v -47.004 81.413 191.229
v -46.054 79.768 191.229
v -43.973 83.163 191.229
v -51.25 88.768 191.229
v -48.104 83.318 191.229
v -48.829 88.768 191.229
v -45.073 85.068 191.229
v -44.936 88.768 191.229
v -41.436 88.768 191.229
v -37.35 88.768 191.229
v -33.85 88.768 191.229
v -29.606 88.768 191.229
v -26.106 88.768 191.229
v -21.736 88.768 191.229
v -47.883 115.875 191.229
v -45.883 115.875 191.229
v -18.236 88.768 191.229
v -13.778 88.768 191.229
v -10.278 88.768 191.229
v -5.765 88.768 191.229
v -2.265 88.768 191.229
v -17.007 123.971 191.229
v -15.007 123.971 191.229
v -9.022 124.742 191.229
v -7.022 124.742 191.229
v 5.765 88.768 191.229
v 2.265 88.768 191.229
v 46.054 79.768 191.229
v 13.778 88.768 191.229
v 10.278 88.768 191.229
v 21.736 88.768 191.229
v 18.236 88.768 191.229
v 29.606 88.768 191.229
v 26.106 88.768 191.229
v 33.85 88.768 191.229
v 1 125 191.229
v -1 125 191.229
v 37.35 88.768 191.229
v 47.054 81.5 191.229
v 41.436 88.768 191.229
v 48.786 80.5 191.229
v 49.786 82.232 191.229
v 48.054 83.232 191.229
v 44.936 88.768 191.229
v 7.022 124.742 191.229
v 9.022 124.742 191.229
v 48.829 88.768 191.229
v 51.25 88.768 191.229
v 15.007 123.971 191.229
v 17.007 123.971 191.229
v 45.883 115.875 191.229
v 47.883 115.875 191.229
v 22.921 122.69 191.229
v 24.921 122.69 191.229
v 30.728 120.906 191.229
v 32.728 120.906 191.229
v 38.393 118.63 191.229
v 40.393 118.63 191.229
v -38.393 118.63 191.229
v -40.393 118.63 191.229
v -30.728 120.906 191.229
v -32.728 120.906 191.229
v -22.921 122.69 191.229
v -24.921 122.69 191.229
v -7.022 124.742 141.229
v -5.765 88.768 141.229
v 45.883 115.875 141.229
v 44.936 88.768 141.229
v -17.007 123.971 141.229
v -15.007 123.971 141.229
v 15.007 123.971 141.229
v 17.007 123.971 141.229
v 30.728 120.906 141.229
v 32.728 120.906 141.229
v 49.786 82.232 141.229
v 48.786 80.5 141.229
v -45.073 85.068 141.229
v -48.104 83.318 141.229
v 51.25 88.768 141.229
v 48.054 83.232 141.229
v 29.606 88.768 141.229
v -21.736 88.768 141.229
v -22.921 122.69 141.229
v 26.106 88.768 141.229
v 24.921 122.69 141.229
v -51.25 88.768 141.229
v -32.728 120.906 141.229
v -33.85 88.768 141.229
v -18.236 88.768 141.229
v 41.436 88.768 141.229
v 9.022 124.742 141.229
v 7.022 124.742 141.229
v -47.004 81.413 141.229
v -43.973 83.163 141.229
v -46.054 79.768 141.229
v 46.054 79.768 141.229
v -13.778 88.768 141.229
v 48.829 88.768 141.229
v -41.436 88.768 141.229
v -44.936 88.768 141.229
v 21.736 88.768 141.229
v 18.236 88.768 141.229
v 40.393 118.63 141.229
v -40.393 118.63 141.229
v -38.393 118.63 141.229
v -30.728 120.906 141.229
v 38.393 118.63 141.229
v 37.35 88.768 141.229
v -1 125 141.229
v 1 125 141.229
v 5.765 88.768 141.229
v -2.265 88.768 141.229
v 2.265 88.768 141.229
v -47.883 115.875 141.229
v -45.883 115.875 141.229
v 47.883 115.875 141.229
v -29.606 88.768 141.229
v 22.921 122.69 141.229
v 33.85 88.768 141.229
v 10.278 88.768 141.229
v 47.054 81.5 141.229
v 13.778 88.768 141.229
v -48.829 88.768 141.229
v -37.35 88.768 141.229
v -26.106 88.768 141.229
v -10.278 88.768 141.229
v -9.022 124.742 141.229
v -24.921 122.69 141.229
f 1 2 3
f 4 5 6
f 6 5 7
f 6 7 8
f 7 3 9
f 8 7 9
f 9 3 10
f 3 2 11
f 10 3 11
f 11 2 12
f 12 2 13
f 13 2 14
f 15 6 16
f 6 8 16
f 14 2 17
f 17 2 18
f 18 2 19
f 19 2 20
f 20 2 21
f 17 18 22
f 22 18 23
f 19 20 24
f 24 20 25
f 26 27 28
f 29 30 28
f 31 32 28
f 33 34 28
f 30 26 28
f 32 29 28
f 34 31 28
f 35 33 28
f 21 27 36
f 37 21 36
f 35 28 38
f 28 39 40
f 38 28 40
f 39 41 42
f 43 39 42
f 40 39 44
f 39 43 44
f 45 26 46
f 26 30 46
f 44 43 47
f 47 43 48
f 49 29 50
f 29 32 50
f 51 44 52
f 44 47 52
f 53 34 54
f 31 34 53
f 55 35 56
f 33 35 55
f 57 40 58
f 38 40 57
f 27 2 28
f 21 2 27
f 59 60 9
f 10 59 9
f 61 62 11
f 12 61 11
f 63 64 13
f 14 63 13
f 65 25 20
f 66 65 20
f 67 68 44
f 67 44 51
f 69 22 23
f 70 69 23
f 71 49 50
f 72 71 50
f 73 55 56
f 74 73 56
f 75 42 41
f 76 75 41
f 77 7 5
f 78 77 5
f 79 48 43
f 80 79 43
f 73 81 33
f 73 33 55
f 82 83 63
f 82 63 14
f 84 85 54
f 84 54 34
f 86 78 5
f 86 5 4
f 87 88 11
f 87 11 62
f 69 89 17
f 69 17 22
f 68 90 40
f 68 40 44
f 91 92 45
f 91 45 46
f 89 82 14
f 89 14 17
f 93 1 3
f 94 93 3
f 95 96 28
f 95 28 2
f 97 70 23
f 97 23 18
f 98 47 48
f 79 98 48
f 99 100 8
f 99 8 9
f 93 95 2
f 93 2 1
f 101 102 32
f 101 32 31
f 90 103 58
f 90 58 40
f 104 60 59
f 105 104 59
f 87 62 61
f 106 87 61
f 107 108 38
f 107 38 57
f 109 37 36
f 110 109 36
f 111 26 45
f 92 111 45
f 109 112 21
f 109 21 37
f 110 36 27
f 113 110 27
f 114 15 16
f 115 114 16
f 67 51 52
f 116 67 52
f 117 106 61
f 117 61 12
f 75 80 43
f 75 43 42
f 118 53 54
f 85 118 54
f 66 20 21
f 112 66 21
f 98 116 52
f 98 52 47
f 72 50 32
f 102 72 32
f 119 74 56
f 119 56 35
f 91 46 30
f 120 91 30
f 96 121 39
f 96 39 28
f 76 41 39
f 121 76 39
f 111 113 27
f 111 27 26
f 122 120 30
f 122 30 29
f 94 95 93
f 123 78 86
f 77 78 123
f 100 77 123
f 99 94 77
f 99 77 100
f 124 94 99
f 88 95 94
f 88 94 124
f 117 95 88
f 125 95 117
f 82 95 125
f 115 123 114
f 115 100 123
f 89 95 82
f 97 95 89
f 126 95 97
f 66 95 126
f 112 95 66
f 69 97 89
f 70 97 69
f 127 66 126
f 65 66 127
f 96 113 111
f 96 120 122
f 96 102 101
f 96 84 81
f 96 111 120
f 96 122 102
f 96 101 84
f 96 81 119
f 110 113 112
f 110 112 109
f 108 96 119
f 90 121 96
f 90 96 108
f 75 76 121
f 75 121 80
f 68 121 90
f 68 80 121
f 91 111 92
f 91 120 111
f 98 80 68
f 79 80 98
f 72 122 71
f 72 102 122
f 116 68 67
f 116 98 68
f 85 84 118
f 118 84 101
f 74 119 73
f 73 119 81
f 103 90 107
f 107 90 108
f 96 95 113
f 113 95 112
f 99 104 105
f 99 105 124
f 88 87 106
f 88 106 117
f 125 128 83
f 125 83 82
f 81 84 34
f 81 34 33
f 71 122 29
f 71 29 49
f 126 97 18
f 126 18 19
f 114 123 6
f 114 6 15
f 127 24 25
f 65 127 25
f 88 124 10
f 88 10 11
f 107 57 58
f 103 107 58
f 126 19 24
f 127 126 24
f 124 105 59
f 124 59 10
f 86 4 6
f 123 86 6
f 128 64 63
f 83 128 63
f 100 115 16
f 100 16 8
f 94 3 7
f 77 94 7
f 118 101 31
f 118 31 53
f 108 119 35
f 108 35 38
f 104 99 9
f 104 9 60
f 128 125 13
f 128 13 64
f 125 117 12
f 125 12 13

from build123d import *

# Parameters (mm, degrees)
RESSALTO_EXTRUS_O1_DEPTH    = 285
CORTE_EXTRUS_O1_DEPTH       = 286
RESSALTO_EXTRUS_O3_DEPTH    = 285
ESBO_O13_W                  = 1.5
ESBO_O13_H                  = 2
CORTE_EXTRUS_O7_DEPTH       = 52.25
CORTE_EXTRUS_O7_DEPTH_BACK  = 52.25
RESSALTO_EXTRUS_O5_DEPTH    = 10
ESBO_O5_R                   = 1.25
CORTE_EXTRUS_O3_DEPTH       = 10
ESBO_O6_W                   = 10
ESBO_O6_H                   = 6.190700041
RESSALTO_EXTRUS_O4_DEPTH    = 11
ESBO_O7_R                   = 2.25
CORTE_EXTRUS_O4_DEPTH       = 12
ESBO_O9_R                   = 1.65
CORTE_EXTRUS_O5_DEPTH       = 10
RESSALTO_EXTRUS_O6_DEPTH    = 15
ESBO_O12_R                  = 2.5
CORTE_EXTRUS_O8_DEPTH       = 20
CORTE_EXTRUS_O9_START       = -11
ESBO_O14_R                  = 6
CORTE_EXTRUS_O9_DEPTH       = 100
PADR_O_LINEAR1_COUNT        = 2
PADR_O_LINEAR1_PITCH        = 230
ESBO_O16_W                  = 118.931950447
ESBO_O16_H                  = 98.407051197
ESBO_O16_W_2                = 168.047643727
ESBO_O16_H_2                = 92.783791129
CORTE_EXTRUS_O11_DEPTH      = 55.553847577
CORTE_EXTRUS_O11_DEPTH_BACK = 55.603847577


with BuildPart() as part:
    # Esboço1 → Ressalto-extrusão1 (new body)
    with BuildSketch(Plane.XY):
        Polygon((-46.053847577, 79.767603888), (-51.25, 88.767603888), (-48.82913331, 88.767603888), (-47.882520117, 115.87505904), (-45.882520117, 115.87505904), (-44.935906924, 88.767603888), (-41.435906924, 88.767603888), (-40.393073045, 118.630458973), (-38.393073045, 118.630458973), (-37.350239166, 88.767603888), (-33.850239166, 88.767603888), (-32.727930438, 120.906320886), (-30.727930438, 120.906320886), (-29.60562171, 88.767603888), (-26.10562171, 88.767603888), (-24.921032923, 122.689788425), (-22.921032923, 122.689788425), (-21.736444137, 88.767603888), (-18.236444137, 88.767603888), (-17.007119627, 123.970851902), (-15.007119627, 123.970851902), (-13.777795118, 88.767603888), (-10.277795118, 88.767603888), (-9.021529135, 124.742354757), (-7.021529135, 124.742354757), (-5.765263153, 88.767603888), (-2.265263153, 88.767603888), (-1, 125), (1, 125), (2.265263153, 88.767603888), (5.765263153, 88.767603888), (7.021529135, 124.742354757), (9.021529135, 124.742354757), (10.277795118, 88.767603888), (13.777795118, 88.767603888), (15.007119627, 123.970851902), (17.007119627, 123.970851902), (18.236444137, 88.767603888), (21.736444137, 88.767603888), (22.921032923, 122.689788425), (24.921032923, 122.689788425), (26.10562171, 88.767603888), (29.60562171, 88.767603888), (30.727930438, 120.906320886), (32.727930438, 120.906320886), (33.850239166, 88.767603888), (37.350239166, 88.767603888), (38.393073045, 118.630458973), (40.393073045, 118.630458973), (41.435906924, 88.767603888), (44.935906924, 88.767603888), (45.882520117, 115.87505904), (47.882520117, 115.87505904), (48.82913331, 88.767603888), (51.25, 88.767603888), (46.053847577, 79.767603888), align=None)
    extrude(amount=RESSALTO_EXTRUS_O1_DEPTH)

    # Esboço2 → Corte-extrusão1 (cut, through all)
    with BuildSketch(Plane.XY.offset(285)):
        Polygon((-47.003847577, 81.413052155), (-43.972758664, 83.163052155), (-45.072758664, 85.068308043), (-48.103847577, 83.318308043), align=None)
    extrude(amount=-CORTE_EXTRUS_O1_DEPTH, mode=Mode.SUBTRACT)


with BuildPart() as body_2:
    # Esboço3 → Ressalto-extrusão3 (new body)
    with BuildSketch(Plane.XY.offset(285)):
        Polygon((47.053847577, 81.499654695), (48.053847577, 83.231705503), (49.785898385, 82.231705503), (48.785898385, 80.499654695), align=None)
    extrude(amount=-RESSALTO_EXTRUS_O3_DEPTH)


with BuildPart() as corte_extrus_o7_tool:
    # Esboço13 → Corte-extrusão7 (new body, two sides)
    with BuildSketch(Plane(origin=(0, 0, 0), x_dir=(0, 0, -1), z_dir=(1, 0, 0))) as corte_extrus_o7_sk:
        with Locations((-284.25, 82.767603888)):
            Rectangle(ESBO_O13_W, ESBO_O13_H)
    extrude(amount=CORTE_EXTRUS_O7_DEPTH)
    extrude(corte_extrus_o7_sk.sketch, amount=-CORTE_EXTRUS_O7_DEPTH_BACK)


with BuildPart() as part_1:
    add(part.part)

    # Corte-extrusão7: cut by corte_extrus_o7_tool
    add(corte_extrus_o7_tool.part, mode=Mode.SUBTRACT)



with BuildPart() as body_2_1:
    add(body_2.part)

    # Corte-extrusão7: cut by corte_extrus_o7_tool
    add(corte_extrus_o7_tool.part, mode=Mode.SUBTRACT)


with BuildPart() as part_2:
    add(part_1.part)

    add(body_2_1.part)  # Ressalto-extrusão5 merges body 2
    # Esboço8 → Ressalto-extrusão5 (add)
    with BuildSketch(Plane(origin=(0, 0, 0), x_dir=(0, 0, -1), z_dir=(0.866025404, -0.5, 0))):
        with BuildLine():
            Line((-280, 104.107695155), (-280, 96.107695155))
            Line((-280, 96.107695155), (-270, 96.107695155))
            Line((-270, 96.107695155), (-270, 104.107695155))
            ThreePointArc((-270, 104.107695155), (-275, 109.107695155), (-280, 104.107695155))
        make_face()
    ressalto_extrus_o5 = extrude(amount=-RESSALTO_EXTRUS_O5_DEPTH)

    # Esboço5 → Corte-extrusão3 (cut)
    with BuildSketch(Plane.XY.offset(285)):
        with Locations((-30, 85.267603888)):
            Circle(ESBO_O5_R)
        with Locations((30, 85.267603888)):
            Circle(ESBO_O5_R)
    extrude(amount=-CORTE_EXTRUS_O3_DEPTH, mode=Mode.SUBTRACT)

    # Esboço6 → Ressalto-extrusão4 (add)
    with BuildSketch(Plane(origin=(0, 0, 0), x_dir=(0, 0, 1), z_dir=(-0.866025404, -0.5, 0))):
        with BuildLine():
            Line((280, 102.5), (280, 104.207693629))
            ThreePointArc((280, 104.207693629), (275, 109.207695155), (270, 104.207693629))
            Line((270, 104.207693629), (270, 102.5))
            Line((270, 102.5), (280, 102.5))
        make_face()
        with Locations((275, 99.404649979)):
            Rectangle(ESBO_O6_W, ESBO_O6_H)
    ressalto_extrus_o4 = extrude(amount=-RESSALTO_EXTRUS_O4_DEPTH)

    # Esboço7 → Corte-extrusão4 (cut)
    with BuildSketch(Plane(origin=(0, 0, 0), x_dir=(0, 0, 1), z_dir=(-0.866025404, -0.5, 0))):
        with Locations((275, 104.207695155)):
            Circle(ESBO_O7_R)
    corte_extrus_o4 = extrude(amount=-CORTE_EXTRUS_O4_DEPTH, mode=Mode.SUBTRACT)

    # Esboço9 → Corte-extrusão5 (cut)
    with BuildSketch(Plane(origin=(0, 0, 0), x_dir=(0, 0, -1), z_dir=(0.866025404, -0.5, 0))):
        with Locations((-275, 104.107695155)):
            Circle(ESBO_O9_R)
    corte_extrus_o5 = extrude(amount=-CORTE_EXTRUS_O5_DEPTH, mode=Mode.SUBTRACT)

    # Esboço10 → Ressalto-extrusão6 (add)
    with BuildSketch(Plane(origin=(0, 0, 0), x_dir=(-1, 0, 0), z_dir=(0, 0, -1))):
        Polygon((5.765263153, 88.767603888), (6.680885729, 114.987603888), (1.349640577, 114.987603888), (2.265263153, 88.767603888), align=None)
        Polygon((-2.265263153, 88.767603888), (-1.349640577, 114.987603888), (-6.680885729, 114.987603888), (-5.765263153, 88.767603888), align=None)
    extrude(amount=-RESSALTO_EXTRUS_O6_DEPTH)

    # Esboço12 → Corte-extrusão8 (cut)
    with BuildSketch(Plane(origin=(0, 0, 0), x_dir=(-1, 0, 0), z_dir=(0, 0, -1))):
        with Locations((0, 104.999999962)):
            Circle(ESBO_O12_R)
    extrude(amount=-CORTE_EXTRUS_O8_DEPTH, mode=Mode.SUBTRACT)

    # Esboço14 → Corte-extrusão9 (cut)
    with BuildSketch(Plane(origin=(0, 0, 0), x_dir=(0, 0, 1), z_dir=(-0.866025404, -0.5, 0)).offset(CORTE_EXTRUS_O9_START)):
        with Locations((275, 104.207695155)):
            Circle(ESBO_O14_R)
    corte_extrus_o9 = extrude(amount=-CORTE_EXTRUS_O9_DEPTH, mode=Mode.SUBTRACT)

    # Padrão linear1: Ressalto-extrusão5, Ressalto-extrusão4, Corte-extrusão4, Corte-extrusão5, Corte-extrusão9 ×2
    with Locations(*[(0, 0, -i * PADR_O_LINEAR1_PITCH) for i in range(1, PADR_O_LINEAR1_COUNT)]):
        add(ressalto_extrus_o5)
        add(ressalto_extrus_o4)
        add(corte_extrus_o4, mode=Mode.SUBTRACT)
        add(corte_extrus_o5, mode=Mode.SUBTRACT)
        add(corte_extrus_o9, mode=Mode.SUBTRACT)

    # Esboço16 → Corte-extrusão11 (cut, two sides)
    with BuildSketch(Plane(origin=(0, 0, 0), x_dir=(0, 0, -1), z_dir=(1, 0, 0))) as corte_extrus_o11_sk:
        with Locations((-250.695007134, 104.881737693)):
            Rectangle(ESBO_O16_W, ESBO_O16_H)
        with Locations((-57.205210046, 102.070107659)):
            Rectangle(ESBO_O16_W_2, ESBO_O16_H_2)
    extrude(amount=CORTE_EXTRUS_O11_DEPTH, mode=Mode.SUBTRACT)
    extrude(corte_extrus_o11_sk.sketch, amount=-CORTE_EXTRUS_O11_DEPTH_BACK, mode=Mode.SUBTRACT)


solid = part_2.part
